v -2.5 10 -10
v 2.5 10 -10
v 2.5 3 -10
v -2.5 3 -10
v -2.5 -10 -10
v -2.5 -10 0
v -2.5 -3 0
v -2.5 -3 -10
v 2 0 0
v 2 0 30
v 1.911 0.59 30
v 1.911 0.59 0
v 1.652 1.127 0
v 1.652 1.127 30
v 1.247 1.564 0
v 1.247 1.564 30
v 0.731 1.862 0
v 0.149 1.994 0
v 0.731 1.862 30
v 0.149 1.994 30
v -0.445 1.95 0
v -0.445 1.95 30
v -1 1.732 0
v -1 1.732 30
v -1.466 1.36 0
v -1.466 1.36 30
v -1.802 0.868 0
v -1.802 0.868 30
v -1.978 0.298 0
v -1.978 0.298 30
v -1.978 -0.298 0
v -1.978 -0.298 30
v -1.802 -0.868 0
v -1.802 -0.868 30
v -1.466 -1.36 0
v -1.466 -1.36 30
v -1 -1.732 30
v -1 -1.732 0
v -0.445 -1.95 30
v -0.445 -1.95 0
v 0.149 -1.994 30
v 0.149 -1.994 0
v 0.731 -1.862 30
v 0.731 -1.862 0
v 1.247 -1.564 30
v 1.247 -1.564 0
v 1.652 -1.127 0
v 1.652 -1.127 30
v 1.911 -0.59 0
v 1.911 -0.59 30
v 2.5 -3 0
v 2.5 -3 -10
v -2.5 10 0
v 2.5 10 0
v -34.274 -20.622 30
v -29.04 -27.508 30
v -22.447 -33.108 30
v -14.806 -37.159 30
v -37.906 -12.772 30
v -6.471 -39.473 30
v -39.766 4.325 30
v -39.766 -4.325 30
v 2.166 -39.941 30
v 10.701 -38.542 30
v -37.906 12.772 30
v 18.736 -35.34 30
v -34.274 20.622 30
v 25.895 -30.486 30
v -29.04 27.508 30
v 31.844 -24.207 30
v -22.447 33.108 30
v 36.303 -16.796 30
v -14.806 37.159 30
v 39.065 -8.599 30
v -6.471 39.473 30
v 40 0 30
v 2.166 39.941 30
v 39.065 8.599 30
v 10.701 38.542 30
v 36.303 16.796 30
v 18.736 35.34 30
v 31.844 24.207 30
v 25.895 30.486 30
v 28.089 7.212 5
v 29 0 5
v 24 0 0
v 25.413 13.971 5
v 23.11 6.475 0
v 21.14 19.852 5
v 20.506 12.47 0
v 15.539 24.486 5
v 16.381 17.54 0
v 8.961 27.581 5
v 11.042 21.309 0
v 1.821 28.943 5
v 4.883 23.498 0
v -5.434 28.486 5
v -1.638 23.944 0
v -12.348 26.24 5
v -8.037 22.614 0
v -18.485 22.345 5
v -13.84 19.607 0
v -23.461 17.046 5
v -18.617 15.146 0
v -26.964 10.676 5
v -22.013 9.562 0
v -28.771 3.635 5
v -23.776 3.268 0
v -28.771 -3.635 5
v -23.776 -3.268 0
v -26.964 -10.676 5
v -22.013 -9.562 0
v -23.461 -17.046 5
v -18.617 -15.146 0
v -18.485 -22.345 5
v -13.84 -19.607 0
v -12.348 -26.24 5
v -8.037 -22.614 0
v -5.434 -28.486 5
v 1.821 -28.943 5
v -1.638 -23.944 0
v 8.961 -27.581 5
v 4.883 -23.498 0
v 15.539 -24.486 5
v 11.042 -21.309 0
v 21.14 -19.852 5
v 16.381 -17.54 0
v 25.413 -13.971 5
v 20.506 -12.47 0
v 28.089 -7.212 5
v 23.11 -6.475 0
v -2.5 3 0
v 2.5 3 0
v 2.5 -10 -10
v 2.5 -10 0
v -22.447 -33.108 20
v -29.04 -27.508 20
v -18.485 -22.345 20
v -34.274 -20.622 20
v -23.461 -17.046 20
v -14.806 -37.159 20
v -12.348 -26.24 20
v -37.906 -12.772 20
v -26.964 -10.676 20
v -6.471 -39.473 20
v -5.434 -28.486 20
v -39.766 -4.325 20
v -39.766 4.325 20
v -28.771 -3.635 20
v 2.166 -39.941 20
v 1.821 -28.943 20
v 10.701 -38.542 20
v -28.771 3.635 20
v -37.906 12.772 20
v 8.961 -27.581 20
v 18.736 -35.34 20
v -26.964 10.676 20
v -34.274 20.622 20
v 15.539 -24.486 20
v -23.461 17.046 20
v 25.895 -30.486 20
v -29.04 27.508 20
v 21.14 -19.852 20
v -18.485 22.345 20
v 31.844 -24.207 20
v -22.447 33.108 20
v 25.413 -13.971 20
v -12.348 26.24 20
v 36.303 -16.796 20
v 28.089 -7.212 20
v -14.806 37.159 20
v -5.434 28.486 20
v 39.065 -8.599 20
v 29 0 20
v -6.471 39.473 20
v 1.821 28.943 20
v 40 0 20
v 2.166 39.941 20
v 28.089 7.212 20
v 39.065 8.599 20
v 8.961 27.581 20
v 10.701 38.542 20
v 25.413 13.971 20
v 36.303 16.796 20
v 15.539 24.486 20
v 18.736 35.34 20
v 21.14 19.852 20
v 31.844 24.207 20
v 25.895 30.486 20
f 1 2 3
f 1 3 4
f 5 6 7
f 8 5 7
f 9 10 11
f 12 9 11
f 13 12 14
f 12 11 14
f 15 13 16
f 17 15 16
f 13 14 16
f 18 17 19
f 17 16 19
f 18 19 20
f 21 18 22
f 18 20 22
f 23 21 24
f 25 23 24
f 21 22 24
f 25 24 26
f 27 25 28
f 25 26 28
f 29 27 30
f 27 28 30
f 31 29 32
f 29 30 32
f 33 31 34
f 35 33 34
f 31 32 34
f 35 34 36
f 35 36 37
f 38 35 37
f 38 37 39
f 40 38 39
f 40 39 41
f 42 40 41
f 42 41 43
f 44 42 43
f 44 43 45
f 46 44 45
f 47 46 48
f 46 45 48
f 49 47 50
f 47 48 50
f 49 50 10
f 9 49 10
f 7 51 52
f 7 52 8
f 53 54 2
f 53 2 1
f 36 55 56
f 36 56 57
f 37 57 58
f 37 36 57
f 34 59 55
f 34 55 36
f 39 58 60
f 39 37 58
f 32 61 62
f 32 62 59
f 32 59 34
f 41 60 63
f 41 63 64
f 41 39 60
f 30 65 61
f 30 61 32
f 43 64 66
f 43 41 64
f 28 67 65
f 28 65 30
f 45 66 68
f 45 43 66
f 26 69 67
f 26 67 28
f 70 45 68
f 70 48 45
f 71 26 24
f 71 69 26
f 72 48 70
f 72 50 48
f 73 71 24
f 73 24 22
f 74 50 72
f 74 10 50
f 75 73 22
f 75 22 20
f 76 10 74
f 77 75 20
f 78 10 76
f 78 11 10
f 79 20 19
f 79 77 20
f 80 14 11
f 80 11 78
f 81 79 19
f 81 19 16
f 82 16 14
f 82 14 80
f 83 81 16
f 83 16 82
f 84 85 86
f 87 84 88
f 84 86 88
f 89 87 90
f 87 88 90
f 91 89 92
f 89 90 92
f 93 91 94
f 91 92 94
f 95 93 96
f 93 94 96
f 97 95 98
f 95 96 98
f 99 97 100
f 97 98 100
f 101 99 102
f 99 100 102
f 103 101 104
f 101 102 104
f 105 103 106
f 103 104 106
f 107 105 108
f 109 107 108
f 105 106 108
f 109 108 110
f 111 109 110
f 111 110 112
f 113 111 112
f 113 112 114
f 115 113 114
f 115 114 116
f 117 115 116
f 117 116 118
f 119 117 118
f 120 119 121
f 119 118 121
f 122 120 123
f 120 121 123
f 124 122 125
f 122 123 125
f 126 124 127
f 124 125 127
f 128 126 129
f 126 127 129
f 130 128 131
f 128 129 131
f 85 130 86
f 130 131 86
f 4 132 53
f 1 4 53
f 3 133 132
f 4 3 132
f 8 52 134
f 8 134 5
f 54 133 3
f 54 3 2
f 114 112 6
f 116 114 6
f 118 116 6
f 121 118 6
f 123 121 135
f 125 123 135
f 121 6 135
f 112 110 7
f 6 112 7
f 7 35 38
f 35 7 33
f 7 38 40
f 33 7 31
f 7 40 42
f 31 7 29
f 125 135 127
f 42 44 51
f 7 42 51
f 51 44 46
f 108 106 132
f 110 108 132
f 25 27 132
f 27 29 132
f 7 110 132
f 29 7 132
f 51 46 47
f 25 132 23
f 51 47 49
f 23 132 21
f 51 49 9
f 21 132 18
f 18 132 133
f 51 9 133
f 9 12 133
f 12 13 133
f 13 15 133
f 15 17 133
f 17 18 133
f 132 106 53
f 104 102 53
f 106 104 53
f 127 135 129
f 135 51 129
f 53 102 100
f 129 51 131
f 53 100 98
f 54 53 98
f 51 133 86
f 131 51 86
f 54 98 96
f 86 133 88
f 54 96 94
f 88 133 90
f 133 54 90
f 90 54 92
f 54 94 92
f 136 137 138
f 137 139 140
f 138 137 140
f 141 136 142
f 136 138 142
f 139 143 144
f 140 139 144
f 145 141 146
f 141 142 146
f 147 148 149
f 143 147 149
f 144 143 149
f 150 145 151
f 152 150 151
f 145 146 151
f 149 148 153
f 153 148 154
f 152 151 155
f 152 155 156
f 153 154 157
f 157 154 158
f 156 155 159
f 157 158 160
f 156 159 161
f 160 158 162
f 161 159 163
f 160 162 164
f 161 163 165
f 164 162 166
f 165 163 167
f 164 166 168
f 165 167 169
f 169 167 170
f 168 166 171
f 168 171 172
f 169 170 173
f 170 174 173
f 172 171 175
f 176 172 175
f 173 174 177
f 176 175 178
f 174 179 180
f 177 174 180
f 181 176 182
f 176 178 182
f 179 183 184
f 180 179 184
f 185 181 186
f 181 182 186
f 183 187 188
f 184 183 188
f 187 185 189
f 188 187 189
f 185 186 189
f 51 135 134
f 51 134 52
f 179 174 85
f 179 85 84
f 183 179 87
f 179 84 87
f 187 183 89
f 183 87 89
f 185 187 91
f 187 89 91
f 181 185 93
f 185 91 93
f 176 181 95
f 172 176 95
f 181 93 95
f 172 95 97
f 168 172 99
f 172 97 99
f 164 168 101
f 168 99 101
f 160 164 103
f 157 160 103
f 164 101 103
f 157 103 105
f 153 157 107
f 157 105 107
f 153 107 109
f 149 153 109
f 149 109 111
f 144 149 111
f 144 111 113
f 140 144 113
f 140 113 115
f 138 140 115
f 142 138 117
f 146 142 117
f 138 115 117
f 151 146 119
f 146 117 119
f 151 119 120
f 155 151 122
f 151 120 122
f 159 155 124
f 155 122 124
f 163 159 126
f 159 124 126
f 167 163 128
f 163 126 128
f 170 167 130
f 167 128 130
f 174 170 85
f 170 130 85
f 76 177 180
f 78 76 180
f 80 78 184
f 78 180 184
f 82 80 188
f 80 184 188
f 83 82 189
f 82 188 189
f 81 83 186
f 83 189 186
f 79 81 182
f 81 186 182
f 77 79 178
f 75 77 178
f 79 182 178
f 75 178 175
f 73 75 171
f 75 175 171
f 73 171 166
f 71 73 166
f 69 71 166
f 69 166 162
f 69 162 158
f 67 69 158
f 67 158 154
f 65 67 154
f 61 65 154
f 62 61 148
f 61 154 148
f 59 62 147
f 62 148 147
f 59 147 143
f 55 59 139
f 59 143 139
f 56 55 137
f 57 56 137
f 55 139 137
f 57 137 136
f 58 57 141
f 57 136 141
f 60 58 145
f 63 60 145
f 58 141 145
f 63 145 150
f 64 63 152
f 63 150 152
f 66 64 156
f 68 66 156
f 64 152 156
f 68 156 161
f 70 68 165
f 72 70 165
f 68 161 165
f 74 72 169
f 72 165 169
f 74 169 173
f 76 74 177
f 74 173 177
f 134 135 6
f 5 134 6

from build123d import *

# Parameters (mm, degrees)
ESQUISSE1_R             = 29
BOSS_EXTRU_1_DEPTH      = 20
ESQUISSE2_R             = 40
BOSS_EXTRU_2_DEPTH      = 10
CHANFREIN1_SIZE         = 5
ESQUISSE3_R             = 2
ENL_V_MAT_EXTRU_1_DEPTH = 30
ESQUISSE4_W             = 5
ESQUISSE4_H             = 7
BOSS_EXTRU_4_DEPTH      = 10


with BuildPart() as part:
    # Esquisse1 → Boss.-Extru.1 (new body)
    with BuildSketch(Plane.XY):
        Circle(ESQUISSE1_R)
    extrude(amount=BOSS_EXTRU_1_DEPTH)

    # Esquisse2 → Boss.-Extru.2 (add)
    with BuildSketch(Plane.XY.offset(20)):
        Circle(ESQUISSE2_R)
    extrude(amount=BOSS_EXTRU_2_DEPTH)

    # Chanfrein1
    chanfrein1_edges = [part.edges().sort_by_distance(p)[0] for p in [
        (-29, 0, 0),
    ]]
    chamfer(chanfrein1_edges, length=CHANFREIN1_SIZE)

    # Esquisse3 → Enlèv. mat.-Extru.1 (cut)
    with BuildSketch(Plane.XY.offset(30)):
        Circle(ESQUISSE3_R)
    extrude(amount=-ENL_V_MAT_EXTRU_1_DEPTH, mode=Mode.SUBTRACT)

    # Esquisse4 → Boss.-Extru.4 (add)
    with BuildSketch(Plane(origin=(0, 0, 0), x_dir=(-1, 0, 0), z_dir=(0, 0, -1))):
        with Locations((0, 6.5)):
            Rectangle(ESQUISSE4_W, ESQUISSE4_H)
        with Locations((0, -6.5)):
            Rectangle(ESQUISSE4_W, ESQUISSE4_H)
    extrude(amount=BOSS_EXTRU_4_DEPTH)


solid = part.part
